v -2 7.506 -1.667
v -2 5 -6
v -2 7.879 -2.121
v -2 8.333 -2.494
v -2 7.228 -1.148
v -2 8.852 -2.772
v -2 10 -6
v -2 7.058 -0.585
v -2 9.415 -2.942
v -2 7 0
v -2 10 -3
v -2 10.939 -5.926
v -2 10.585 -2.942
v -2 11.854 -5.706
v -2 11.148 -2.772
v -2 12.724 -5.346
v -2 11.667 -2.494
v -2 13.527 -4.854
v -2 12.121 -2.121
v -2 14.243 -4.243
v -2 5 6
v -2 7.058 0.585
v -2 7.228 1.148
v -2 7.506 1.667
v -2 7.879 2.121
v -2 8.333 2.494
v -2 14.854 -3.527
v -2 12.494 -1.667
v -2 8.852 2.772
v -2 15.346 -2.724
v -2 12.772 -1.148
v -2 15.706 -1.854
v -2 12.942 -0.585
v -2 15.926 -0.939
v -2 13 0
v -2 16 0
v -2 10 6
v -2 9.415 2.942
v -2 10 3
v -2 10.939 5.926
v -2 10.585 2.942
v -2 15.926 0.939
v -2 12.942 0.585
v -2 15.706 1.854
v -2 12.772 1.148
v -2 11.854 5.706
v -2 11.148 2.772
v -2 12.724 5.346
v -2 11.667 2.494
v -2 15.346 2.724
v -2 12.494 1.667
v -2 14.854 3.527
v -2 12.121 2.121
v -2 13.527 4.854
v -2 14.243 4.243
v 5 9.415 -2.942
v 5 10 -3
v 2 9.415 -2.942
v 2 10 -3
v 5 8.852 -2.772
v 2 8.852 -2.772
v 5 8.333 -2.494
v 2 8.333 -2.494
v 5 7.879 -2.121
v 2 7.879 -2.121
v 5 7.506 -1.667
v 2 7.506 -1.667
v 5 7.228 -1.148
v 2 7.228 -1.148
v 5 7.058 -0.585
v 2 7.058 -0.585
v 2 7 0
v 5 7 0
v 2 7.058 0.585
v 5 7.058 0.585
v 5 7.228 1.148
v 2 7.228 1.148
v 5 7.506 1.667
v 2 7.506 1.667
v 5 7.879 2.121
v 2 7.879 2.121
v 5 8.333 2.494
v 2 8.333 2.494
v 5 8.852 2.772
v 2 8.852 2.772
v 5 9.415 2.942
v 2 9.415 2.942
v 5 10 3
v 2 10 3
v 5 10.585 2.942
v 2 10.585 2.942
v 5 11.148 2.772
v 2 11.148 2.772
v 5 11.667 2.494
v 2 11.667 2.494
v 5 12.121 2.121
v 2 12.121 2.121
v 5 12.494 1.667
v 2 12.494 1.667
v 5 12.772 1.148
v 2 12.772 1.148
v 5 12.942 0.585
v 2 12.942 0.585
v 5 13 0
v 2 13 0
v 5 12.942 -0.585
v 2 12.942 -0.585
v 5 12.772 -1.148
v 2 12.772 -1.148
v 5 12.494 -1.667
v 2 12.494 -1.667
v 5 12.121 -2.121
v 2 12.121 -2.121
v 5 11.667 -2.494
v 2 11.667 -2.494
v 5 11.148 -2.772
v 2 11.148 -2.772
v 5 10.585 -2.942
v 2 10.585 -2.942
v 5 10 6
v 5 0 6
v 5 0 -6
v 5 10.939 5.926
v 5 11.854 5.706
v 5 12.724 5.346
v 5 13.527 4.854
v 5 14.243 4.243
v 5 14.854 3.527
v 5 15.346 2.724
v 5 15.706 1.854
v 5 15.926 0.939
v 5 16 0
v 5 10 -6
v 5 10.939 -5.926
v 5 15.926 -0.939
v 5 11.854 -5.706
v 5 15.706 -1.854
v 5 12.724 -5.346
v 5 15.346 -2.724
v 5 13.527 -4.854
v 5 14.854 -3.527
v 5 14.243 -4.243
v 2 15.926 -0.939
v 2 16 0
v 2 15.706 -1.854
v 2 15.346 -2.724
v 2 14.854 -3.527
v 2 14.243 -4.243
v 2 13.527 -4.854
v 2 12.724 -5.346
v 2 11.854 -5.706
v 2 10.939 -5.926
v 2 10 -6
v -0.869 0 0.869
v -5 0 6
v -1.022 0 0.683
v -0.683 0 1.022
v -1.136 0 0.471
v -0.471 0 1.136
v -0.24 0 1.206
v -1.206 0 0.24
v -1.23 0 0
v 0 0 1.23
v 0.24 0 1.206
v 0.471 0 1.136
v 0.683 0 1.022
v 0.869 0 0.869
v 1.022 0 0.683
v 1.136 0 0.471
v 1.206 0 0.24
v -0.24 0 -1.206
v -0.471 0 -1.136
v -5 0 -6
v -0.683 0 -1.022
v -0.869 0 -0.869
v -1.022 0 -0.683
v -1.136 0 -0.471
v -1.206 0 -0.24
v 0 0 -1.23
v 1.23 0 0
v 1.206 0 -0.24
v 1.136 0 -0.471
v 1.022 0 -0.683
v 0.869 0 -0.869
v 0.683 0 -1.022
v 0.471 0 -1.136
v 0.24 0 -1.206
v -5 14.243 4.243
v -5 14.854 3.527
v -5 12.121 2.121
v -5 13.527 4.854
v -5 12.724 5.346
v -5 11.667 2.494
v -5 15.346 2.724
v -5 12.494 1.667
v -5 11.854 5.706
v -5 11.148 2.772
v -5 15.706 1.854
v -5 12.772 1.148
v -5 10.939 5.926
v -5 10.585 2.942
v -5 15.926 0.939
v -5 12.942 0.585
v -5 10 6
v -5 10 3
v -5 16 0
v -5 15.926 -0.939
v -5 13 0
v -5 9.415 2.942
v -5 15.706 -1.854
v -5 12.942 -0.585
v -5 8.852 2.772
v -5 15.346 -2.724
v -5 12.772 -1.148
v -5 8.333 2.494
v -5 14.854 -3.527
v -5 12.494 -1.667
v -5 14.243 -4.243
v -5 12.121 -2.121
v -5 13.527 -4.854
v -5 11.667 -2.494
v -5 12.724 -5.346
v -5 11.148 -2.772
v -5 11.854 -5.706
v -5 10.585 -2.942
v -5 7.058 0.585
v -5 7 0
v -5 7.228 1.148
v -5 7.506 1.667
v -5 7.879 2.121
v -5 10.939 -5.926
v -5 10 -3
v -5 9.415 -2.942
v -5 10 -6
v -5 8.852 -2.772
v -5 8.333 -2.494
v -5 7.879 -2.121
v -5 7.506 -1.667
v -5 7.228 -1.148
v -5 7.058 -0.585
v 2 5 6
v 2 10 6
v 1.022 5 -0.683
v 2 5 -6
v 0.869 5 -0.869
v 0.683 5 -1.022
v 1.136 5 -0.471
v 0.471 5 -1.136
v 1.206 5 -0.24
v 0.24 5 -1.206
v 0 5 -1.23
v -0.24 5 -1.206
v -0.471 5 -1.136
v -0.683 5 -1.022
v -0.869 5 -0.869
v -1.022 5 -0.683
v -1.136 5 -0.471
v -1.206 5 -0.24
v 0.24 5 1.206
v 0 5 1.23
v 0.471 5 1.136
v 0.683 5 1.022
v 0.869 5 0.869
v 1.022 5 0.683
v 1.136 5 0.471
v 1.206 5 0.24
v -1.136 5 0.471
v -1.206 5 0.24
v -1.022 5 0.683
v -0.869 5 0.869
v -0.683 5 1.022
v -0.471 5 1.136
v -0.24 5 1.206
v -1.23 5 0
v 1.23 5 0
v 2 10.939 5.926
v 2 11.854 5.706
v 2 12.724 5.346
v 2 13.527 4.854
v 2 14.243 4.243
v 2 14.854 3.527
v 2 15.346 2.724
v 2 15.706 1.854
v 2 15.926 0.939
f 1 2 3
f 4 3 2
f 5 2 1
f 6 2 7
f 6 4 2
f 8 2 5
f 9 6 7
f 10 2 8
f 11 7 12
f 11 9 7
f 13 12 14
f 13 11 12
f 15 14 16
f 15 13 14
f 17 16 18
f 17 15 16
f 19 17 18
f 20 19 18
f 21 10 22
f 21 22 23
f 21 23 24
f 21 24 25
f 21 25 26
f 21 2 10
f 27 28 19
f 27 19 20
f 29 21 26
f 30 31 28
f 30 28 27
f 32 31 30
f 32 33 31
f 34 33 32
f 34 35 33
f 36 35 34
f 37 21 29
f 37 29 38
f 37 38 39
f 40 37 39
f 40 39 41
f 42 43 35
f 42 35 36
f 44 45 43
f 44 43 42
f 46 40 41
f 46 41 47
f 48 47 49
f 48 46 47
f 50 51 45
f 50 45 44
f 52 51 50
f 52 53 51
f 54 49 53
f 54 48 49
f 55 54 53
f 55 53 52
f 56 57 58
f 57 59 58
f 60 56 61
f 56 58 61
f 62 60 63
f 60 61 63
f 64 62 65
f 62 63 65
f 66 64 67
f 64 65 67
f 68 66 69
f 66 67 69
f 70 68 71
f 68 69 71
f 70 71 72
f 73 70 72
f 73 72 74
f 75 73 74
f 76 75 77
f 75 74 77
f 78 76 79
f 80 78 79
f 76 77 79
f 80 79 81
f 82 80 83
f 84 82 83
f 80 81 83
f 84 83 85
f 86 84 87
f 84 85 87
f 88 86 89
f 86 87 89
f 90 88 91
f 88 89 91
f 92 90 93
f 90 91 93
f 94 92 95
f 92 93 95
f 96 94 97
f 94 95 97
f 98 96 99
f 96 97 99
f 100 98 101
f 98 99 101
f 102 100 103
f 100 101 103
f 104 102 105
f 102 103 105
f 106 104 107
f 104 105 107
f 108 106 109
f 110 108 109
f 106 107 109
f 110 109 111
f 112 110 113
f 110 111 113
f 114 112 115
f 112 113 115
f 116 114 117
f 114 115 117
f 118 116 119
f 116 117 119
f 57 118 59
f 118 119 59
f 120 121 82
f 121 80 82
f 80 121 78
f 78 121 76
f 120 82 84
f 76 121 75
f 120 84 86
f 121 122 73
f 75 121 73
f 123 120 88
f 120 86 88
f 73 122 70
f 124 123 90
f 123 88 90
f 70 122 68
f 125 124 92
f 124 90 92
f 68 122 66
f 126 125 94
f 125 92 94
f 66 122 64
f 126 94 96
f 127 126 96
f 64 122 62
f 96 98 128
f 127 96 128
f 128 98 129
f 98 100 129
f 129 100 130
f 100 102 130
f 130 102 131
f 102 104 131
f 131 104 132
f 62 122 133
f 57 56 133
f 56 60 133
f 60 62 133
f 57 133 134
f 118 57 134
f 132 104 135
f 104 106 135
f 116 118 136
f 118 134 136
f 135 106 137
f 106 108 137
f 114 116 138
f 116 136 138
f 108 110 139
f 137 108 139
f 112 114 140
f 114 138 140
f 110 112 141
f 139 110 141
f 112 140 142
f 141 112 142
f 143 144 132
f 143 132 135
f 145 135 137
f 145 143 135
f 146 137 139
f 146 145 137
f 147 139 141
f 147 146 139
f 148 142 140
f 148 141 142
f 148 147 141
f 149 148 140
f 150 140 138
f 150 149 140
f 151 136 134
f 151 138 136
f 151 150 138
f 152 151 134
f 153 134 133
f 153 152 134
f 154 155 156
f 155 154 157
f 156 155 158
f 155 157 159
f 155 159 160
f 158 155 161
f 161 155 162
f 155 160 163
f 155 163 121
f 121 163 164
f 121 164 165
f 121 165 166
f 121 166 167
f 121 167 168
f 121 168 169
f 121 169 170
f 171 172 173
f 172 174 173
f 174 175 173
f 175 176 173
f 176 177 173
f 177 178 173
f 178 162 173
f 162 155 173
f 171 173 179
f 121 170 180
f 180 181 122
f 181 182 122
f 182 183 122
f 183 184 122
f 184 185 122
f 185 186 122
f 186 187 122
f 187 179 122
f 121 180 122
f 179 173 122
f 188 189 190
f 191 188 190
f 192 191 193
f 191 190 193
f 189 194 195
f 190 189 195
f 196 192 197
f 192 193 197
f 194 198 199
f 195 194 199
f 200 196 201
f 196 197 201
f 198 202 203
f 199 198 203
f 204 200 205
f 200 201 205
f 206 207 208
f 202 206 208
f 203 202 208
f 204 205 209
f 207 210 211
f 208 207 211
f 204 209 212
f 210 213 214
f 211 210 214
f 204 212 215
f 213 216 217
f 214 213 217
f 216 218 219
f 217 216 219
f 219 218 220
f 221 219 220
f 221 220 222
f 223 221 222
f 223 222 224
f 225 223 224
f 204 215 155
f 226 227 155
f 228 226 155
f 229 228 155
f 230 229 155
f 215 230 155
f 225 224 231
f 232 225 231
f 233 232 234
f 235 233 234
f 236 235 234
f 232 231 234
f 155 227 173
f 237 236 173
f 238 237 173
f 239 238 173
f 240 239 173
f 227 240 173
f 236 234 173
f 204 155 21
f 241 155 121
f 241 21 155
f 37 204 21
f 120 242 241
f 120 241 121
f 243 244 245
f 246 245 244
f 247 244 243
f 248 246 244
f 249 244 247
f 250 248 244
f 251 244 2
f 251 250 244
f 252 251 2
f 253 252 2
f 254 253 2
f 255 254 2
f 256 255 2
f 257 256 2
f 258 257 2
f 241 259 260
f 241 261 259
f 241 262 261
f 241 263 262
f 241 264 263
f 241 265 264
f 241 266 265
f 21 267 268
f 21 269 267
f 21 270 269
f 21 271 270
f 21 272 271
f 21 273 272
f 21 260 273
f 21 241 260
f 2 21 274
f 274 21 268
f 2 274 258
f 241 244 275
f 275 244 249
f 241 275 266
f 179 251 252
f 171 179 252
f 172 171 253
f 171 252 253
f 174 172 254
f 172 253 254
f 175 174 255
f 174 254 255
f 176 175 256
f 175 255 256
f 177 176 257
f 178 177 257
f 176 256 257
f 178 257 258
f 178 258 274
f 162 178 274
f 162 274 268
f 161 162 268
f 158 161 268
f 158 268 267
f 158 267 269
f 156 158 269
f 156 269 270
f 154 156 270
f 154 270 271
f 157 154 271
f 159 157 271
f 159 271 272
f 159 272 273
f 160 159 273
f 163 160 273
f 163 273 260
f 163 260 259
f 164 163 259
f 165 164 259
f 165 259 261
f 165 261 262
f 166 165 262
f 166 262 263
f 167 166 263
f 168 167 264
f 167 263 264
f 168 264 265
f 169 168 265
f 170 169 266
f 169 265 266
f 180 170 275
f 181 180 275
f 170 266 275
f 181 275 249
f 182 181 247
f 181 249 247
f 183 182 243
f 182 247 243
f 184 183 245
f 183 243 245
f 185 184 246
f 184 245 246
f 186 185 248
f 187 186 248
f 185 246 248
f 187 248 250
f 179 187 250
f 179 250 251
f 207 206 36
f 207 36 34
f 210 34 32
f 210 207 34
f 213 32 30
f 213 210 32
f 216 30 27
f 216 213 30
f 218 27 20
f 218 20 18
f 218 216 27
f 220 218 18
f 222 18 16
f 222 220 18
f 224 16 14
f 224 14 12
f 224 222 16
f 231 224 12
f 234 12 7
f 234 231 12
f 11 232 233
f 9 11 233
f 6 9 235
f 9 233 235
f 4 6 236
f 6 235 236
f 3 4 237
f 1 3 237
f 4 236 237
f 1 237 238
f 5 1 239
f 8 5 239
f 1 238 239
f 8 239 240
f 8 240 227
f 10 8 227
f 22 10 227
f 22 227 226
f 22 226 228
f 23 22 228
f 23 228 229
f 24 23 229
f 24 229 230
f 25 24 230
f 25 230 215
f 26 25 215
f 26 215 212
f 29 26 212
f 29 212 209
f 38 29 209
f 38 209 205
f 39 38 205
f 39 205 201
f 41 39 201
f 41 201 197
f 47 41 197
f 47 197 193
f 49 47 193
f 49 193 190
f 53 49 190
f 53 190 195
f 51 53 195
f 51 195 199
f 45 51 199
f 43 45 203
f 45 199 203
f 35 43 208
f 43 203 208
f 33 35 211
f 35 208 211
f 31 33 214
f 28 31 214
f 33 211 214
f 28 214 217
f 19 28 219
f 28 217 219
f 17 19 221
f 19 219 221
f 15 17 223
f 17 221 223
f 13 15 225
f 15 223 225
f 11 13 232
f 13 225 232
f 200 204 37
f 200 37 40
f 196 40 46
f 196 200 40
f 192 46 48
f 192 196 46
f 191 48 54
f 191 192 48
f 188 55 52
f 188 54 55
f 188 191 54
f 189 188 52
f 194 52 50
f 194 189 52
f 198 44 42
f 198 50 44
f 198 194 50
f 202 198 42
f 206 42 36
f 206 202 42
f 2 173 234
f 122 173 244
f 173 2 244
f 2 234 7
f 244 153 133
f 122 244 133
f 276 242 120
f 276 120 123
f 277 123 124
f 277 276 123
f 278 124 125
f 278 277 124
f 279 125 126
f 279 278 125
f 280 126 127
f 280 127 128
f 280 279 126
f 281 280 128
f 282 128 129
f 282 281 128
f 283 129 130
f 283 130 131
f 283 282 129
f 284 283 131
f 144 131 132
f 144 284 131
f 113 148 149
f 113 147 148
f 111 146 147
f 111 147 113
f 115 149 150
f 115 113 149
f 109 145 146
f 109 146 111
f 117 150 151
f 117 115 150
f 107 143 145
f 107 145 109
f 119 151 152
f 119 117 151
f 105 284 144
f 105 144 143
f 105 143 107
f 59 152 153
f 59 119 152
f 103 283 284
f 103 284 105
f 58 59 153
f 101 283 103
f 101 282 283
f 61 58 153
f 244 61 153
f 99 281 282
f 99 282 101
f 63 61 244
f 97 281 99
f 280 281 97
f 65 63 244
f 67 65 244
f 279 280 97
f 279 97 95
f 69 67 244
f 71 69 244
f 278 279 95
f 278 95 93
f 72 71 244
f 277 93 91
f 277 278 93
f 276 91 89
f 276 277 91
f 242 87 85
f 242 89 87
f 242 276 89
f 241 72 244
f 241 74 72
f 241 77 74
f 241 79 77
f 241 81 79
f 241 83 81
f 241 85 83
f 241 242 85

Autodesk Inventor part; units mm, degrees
ref_plane "YZ Plane" through (0, 0, 0) normal (1, 0, 0) x (0, 1, 0)
ref_plane "XZ Plane" through (0, 0, 0) normal (0, 1, 0) x (-1, 0, 0)
ref_plane "XY Plane" through (0, 0, 0) normal (0, 0, 1) x (1, 0, 0)
sketch "Sketch1" plane through (0, 0, 0) normal (0, 0, 1) x (1, 0, 0)
  line L0 (-5, 0) -> (5, 0)
  line L1 (5, 0) -> (5, 16)
  line L2 (5, 16) -> (-5, 16)
  line L3 (-5, 16) -> (-5, 0)
  point P0 (0, 0)
  dimension "d0" = 0
  dimension "d1" = 10
  dimension "d2" = 16
  dimension "d3" = 5
extrude "Extrusion1" add sketch "Sketch1" along normal mid plane 12
sketch "Sketch2" plane through (0, 0, 6) normal (0, 0, 1) x (1, 0, 0)
  line L0 (5, 16) -> (-5, 16) projected
  line L1 (-2, 16) -> (2, 16)
  line L2 (2, 16) -> (2, 5)
  line L3 (2, 5) -> (-2, 5)
  line L4 (-2, 5) -> (-2, 16)
  point P0 (0, 0)
  dimension "d6" = 11
  dimension "d7" = 4
  dimension "d8" = 2
extrude "Extrusion2" cut sketch "Sketch2" against normal through all
sketch "Sketch3" plane through (5, 0, 6) normal (1, 0, 0) x (0, 0, -1)
  circle A0 centre (6, 10) radius 3
  line L0 (0, 0) -> (12, 0) projected
  line L1 (12, 16) -> (0, 16) projected
  point P0 (6, 0)
  point P1 (6, 0)
  dimension "d11" = 6
  dimension "d12" = 6
hole "Hole1" at (5, 10, 0) direction (-1, 0, 0) diameter 6 end through all
fillet "Fillet1" radius 6 4 edges at (3.5, 16, 6) (3.5, 16, -6) (-3.5, 16, -6) (-3.5, 16, 6)
sketch "Sketch4" plane through (-5, 0, 6) normal (0, -1, 0) x (1, 0, 0)
  circle A0 centre (5, -6) radius 1.5
  dimension "d21" = 3
hole "Hole2" at (0, 0, 0) direction (0, 1, 0) diameter 2.459 depth 5 thread size "M3x0.5" class "6H" standard "ISO Metric profile"
equation "\"d3\" = 0.5 * d1"
equation "\"d8\" = 0.5 * d7"
equation "\"d13\" = d12"
properties part number "Gripper_Link_Holder" material "Aluminum 6061"
